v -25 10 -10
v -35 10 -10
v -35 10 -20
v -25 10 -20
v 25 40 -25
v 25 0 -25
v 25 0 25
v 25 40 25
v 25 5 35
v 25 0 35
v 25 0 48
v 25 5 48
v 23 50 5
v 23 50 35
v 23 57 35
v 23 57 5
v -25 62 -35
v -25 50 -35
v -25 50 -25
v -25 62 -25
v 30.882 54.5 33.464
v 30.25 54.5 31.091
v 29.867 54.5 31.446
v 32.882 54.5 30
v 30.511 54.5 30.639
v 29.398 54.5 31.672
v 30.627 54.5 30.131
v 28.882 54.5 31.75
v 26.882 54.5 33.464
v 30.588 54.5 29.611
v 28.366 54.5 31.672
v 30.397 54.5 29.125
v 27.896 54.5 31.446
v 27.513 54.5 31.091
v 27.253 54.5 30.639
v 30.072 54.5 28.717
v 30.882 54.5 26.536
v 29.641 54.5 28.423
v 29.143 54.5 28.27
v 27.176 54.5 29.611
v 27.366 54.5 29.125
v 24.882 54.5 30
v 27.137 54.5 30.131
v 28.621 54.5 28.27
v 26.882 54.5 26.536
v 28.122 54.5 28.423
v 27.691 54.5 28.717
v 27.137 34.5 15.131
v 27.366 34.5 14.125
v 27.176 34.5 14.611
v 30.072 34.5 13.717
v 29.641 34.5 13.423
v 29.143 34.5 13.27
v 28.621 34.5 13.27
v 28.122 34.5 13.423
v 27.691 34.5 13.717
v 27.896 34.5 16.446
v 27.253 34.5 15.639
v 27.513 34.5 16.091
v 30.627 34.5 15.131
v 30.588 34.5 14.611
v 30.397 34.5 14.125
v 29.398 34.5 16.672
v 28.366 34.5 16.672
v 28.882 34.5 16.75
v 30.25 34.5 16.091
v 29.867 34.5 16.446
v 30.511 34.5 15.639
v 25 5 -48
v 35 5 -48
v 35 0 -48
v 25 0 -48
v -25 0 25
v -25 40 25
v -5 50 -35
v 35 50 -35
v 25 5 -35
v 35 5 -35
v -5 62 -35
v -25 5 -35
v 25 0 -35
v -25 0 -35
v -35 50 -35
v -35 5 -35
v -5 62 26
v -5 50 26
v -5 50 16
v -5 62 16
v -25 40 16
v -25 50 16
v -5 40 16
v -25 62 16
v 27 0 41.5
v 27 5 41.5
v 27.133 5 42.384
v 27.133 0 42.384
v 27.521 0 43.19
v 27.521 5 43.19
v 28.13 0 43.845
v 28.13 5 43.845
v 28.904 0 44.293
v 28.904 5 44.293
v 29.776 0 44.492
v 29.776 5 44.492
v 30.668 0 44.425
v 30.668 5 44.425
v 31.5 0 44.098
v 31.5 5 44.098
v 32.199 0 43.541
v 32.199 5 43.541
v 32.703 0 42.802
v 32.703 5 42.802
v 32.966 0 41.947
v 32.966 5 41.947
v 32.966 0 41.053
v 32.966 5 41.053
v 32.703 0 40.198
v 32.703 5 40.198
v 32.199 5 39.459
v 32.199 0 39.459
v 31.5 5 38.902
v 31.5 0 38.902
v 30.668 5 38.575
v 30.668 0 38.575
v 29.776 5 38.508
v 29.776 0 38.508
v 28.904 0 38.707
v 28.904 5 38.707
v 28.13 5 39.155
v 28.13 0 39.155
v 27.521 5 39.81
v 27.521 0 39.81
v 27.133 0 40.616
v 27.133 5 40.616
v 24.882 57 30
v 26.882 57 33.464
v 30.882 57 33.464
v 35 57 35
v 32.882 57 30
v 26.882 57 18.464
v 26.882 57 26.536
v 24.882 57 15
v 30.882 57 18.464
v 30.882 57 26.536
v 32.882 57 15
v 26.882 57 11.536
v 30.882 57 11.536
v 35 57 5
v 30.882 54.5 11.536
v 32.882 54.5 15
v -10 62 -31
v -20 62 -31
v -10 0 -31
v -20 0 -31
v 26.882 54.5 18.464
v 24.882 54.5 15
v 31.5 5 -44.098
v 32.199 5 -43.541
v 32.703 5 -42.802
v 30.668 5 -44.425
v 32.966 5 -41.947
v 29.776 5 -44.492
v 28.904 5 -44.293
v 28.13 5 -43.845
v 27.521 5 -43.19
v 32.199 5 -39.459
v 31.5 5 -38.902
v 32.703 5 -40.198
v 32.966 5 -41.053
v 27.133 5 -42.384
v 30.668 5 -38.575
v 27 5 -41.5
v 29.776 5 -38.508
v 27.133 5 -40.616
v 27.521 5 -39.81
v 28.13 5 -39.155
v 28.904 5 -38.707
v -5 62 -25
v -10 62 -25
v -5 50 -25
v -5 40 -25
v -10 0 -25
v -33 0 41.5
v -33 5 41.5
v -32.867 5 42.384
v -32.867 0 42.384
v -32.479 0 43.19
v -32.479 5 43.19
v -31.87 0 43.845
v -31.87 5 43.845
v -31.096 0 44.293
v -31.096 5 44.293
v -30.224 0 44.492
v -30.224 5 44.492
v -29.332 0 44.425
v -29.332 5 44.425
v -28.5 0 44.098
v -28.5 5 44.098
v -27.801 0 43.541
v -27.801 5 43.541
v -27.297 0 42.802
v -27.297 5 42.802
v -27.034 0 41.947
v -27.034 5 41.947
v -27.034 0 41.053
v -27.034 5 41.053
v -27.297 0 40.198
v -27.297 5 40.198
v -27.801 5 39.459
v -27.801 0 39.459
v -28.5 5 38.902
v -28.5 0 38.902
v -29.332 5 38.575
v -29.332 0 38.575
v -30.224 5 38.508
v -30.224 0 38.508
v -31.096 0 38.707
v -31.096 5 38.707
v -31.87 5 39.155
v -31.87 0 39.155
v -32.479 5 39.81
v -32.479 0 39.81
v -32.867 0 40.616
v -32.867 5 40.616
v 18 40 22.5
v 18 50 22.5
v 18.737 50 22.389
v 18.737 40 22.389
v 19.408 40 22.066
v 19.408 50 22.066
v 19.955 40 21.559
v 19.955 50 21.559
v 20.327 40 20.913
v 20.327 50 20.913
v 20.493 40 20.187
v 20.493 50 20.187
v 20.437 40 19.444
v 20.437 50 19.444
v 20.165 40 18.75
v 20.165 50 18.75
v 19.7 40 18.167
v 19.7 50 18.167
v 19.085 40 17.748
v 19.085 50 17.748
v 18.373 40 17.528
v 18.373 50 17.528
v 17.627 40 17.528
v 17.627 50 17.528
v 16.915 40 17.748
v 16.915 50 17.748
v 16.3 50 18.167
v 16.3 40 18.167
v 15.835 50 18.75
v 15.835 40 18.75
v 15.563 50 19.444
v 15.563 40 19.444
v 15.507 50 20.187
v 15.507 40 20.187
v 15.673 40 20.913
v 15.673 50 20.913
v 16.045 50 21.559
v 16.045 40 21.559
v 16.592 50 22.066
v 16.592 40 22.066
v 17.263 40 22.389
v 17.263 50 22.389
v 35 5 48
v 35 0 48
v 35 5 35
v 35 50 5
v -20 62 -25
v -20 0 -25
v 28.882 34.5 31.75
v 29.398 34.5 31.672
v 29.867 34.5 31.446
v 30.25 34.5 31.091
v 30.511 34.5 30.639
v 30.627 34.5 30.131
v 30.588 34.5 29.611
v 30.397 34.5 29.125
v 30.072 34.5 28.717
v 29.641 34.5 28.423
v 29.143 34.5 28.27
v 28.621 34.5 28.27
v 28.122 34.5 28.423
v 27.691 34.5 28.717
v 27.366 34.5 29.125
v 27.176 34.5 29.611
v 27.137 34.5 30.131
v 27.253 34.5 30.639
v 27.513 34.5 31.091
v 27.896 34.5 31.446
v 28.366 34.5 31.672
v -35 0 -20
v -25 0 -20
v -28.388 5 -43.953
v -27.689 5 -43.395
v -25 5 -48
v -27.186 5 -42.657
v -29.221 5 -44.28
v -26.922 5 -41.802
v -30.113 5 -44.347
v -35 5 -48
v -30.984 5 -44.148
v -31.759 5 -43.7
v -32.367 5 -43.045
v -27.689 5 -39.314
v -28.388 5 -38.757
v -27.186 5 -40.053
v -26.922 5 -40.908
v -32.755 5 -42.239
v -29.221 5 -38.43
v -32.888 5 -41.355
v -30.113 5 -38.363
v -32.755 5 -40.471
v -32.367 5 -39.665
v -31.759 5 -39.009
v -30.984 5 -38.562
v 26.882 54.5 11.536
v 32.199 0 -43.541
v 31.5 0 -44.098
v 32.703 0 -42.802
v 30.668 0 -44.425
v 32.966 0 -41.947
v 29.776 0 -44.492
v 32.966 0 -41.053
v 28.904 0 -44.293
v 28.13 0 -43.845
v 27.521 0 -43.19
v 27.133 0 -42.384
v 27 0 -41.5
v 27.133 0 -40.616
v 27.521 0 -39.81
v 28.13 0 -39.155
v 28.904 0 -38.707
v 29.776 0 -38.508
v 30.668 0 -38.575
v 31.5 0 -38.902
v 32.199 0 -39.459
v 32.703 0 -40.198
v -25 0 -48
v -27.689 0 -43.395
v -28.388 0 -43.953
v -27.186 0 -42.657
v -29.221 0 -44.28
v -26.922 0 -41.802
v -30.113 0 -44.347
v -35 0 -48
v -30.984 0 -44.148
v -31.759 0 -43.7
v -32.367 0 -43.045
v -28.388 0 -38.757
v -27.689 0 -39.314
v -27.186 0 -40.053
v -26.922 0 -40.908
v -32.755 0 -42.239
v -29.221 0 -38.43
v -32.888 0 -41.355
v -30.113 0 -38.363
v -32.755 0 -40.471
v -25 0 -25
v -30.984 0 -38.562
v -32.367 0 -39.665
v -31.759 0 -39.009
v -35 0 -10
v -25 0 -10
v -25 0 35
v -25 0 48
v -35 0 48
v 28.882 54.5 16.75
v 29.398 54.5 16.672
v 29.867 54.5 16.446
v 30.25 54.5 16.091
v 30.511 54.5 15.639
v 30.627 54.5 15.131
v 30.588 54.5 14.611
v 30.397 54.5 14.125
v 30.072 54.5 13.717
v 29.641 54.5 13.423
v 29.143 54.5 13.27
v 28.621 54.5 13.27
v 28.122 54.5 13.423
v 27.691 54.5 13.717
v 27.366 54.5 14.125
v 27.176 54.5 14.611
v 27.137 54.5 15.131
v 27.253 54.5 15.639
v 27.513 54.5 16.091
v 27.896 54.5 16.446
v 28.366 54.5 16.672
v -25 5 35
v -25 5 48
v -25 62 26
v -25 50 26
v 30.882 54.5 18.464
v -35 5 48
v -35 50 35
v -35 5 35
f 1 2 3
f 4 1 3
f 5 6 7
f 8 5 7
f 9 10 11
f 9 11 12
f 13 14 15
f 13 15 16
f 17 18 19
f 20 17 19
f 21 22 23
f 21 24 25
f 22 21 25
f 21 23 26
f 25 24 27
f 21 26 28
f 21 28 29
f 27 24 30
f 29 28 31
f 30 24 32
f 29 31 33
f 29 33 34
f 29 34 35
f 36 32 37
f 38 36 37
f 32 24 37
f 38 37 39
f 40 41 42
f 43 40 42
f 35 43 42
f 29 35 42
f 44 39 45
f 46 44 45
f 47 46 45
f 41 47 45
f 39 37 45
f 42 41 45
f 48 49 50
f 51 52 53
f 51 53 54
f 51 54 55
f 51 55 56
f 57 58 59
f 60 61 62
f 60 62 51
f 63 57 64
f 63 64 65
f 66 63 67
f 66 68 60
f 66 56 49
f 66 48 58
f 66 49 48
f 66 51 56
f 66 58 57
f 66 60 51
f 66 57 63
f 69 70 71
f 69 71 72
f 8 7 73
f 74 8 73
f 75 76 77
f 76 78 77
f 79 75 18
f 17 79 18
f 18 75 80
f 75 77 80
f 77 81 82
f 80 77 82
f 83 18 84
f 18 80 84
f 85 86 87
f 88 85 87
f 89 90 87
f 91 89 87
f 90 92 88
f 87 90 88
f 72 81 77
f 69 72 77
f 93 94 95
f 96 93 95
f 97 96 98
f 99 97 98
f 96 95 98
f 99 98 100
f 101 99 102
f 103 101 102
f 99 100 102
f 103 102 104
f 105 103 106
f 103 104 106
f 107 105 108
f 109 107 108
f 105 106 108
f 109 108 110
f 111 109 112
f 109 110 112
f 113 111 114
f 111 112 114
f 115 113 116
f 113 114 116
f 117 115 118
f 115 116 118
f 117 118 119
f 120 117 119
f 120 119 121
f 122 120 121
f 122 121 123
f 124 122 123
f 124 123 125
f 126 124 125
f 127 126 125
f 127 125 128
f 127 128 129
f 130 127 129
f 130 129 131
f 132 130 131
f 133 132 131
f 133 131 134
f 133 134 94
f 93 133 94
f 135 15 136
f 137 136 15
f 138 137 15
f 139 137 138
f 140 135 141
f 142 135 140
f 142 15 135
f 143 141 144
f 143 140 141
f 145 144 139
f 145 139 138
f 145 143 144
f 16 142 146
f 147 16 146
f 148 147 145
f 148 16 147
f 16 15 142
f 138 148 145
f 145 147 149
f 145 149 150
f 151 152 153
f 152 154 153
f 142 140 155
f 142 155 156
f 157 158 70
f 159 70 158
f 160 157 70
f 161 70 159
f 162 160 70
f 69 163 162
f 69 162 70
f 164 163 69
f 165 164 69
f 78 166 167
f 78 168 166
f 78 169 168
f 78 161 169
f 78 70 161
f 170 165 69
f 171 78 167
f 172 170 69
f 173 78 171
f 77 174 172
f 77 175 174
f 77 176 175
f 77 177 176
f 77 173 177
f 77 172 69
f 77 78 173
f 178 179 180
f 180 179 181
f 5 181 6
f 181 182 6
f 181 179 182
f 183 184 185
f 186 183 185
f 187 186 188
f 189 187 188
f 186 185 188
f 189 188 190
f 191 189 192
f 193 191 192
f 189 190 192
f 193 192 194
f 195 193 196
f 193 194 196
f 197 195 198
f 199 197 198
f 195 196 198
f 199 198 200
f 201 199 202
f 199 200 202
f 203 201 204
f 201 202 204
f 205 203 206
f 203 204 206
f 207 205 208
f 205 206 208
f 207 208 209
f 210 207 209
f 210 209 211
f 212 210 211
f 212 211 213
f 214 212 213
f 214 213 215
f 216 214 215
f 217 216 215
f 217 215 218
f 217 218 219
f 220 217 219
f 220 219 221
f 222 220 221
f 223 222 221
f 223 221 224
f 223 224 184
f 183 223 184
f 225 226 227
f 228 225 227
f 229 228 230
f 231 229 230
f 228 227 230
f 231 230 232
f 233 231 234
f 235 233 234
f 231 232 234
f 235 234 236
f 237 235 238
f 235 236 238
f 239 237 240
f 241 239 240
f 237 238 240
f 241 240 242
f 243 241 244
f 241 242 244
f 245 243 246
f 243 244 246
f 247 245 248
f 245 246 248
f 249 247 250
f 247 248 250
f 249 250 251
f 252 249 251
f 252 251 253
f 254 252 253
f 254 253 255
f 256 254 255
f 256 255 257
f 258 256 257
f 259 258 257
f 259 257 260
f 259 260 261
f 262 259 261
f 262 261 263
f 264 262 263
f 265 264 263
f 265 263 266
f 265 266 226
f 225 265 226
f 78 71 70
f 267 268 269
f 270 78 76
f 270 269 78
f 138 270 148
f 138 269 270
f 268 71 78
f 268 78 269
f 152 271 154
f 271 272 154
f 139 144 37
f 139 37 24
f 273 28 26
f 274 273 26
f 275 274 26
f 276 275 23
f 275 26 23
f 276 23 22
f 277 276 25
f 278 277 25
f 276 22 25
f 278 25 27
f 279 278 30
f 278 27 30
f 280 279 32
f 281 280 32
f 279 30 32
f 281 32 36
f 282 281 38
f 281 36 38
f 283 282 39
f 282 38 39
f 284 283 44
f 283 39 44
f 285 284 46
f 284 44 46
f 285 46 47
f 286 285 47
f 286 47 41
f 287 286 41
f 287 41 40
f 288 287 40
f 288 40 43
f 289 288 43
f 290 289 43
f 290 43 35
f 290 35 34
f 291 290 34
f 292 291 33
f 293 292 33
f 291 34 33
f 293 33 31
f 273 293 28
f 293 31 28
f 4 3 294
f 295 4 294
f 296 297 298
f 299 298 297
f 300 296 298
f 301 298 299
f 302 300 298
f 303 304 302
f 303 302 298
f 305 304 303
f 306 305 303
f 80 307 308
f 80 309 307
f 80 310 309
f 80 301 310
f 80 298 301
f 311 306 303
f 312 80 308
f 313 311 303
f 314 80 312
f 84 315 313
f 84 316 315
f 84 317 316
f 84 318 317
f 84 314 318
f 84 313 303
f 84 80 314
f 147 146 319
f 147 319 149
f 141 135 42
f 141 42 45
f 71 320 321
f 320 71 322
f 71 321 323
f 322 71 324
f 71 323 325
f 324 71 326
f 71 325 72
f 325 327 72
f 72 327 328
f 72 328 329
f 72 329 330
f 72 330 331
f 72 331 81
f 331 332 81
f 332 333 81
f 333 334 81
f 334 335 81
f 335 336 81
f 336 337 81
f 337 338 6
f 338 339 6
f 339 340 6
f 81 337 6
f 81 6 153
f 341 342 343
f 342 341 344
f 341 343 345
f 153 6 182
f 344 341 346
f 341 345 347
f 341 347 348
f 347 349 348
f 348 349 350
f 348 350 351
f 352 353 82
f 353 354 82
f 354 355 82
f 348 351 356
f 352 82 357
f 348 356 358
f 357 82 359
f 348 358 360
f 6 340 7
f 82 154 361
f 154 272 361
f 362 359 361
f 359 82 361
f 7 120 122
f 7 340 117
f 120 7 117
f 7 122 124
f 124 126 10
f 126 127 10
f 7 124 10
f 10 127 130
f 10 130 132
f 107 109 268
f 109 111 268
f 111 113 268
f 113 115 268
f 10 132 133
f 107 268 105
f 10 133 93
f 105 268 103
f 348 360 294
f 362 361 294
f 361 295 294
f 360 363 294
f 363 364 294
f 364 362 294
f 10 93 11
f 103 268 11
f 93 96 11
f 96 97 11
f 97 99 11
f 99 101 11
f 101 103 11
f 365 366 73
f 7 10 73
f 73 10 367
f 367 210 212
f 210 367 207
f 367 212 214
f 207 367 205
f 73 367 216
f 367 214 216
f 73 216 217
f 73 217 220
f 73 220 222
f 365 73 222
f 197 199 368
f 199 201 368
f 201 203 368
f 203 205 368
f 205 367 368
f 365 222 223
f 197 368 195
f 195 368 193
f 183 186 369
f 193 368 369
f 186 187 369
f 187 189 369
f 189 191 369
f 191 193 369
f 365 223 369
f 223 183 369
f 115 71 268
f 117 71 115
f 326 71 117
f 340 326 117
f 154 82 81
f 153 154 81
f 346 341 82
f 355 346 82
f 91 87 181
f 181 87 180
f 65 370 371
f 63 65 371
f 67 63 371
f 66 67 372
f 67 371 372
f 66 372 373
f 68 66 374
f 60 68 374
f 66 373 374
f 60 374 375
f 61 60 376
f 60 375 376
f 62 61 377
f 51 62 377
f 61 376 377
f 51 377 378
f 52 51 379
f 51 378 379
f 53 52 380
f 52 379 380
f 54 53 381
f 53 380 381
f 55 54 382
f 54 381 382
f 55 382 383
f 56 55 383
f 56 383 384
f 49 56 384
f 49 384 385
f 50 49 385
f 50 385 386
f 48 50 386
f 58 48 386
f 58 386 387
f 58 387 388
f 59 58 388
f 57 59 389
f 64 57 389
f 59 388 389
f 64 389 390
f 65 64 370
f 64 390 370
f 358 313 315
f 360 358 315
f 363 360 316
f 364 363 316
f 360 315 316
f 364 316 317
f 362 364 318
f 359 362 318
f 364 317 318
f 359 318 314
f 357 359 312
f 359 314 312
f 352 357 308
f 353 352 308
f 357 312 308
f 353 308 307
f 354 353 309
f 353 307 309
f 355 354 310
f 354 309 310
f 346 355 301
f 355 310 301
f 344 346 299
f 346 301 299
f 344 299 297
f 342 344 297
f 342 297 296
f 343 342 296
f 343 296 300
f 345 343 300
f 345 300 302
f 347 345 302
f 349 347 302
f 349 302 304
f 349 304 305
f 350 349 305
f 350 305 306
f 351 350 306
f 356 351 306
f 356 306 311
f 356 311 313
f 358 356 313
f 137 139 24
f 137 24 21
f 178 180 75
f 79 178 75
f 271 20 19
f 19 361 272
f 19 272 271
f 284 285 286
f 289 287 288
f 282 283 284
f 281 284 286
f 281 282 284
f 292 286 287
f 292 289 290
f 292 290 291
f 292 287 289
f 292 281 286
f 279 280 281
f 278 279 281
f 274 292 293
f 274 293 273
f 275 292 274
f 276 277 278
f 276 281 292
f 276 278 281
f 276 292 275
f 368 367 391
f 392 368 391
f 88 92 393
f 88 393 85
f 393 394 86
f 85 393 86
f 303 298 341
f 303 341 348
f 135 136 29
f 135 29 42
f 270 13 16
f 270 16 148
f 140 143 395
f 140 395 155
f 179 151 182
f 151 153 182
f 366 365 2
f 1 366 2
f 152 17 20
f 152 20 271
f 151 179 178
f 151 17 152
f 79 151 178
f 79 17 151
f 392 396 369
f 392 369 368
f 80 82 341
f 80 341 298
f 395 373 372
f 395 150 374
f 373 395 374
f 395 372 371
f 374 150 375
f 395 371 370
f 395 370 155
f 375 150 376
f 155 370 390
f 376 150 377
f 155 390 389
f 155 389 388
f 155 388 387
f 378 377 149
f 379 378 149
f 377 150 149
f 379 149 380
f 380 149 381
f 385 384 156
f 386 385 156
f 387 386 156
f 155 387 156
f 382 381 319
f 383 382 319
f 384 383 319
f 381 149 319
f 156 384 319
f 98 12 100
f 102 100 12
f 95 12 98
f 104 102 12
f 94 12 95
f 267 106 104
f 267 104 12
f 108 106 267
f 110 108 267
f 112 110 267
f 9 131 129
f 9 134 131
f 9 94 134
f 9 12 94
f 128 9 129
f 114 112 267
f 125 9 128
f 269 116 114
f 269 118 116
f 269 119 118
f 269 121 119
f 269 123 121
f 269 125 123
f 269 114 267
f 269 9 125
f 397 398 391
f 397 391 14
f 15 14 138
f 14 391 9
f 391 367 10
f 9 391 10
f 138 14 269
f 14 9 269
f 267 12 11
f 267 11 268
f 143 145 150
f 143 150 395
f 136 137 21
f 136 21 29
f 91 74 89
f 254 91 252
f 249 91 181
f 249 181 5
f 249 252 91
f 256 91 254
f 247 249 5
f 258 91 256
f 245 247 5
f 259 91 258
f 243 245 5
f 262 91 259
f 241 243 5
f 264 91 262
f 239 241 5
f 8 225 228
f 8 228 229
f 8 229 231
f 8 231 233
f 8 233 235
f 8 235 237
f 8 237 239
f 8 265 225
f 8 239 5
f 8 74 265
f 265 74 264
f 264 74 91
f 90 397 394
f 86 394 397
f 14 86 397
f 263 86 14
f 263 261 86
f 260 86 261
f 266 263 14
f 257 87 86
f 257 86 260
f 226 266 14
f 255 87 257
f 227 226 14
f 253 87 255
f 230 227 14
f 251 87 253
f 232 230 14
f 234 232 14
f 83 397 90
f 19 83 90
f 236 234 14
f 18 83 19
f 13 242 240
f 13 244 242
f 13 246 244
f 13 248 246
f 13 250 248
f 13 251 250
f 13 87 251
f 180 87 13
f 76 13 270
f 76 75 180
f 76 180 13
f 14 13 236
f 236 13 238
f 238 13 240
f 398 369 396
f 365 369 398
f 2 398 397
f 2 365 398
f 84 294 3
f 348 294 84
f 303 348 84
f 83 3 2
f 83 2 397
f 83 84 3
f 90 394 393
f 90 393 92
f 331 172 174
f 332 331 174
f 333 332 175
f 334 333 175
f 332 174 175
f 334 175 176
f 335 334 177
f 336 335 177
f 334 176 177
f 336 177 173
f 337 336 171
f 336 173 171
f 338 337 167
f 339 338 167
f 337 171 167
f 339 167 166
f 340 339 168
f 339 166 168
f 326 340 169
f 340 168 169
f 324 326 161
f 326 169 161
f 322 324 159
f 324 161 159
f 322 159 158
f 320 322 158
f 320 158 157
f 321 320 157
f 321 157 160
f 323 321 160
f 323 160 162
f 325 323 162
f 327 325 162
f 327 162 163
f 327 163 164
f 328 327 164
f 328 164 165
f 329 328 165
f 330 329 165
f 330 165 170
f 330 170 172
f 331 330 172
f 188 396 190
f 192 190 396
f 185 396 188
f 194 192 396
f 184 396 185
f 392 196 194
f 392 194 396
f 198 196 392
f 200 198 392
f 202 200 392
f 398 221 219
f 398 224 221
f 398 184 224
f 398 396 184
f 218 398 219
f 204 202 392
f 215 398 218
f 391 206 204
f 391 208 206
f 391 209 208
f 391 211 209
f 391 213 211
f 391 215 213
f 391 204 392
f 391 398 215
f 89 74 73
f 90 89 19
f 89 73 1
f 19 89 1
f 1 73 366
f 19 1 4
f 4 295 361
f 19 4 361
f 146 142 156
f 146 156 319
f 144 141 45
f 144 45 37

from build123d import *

# Parameters (mm, degrees)
SKETCH1_W           = 70
SKETCH1_H           = 70
BOSS_EXTRUDE1_DEPTH = 50
CUT_EXTRUDE1_DEPTH  = 40
SKETCH3_W           = 20
SKETCH3_H           = 41
CUT_EXTRUDE2_DEPTH  = 40
SKETCH4_W           = 12
SKETCH4_H           = 30
BOSS_EXTRUDE2_DEPTH = 7
CUT_EXTRUDE3_DEPTH  = 2.5
SKETCH7_R           = 2.5
CUT_EXTRUDE4_DEPTH  = 52.5
SKETCH10_W          = 10
SKETCH10_H          = 6
CUT_EXTRUDE6_DEPTH  = 55
SKETCH11_W          = 20
SKETCH11_H          = 10
BOSS_EXTRUDE3_DEPTH = 12
SKETCH13_W          = 10
SKETCH13_H          = 5
BOSS_EXTRUDE4_DEPTH = 13
SKETCH14_W          = 10
SKETCH14_H          = 5
BOSS_EXTRUDE5_DEPTH = 13
SKETCH15_R          = 3
CUT_EXTRUDE7_DEPTH  = 33
CUT_EXTRUDE8_DEPTH  = 10
SKETCH18_R          = 1.75
CUT_EXTRUDE9_DEPTH  = 20


with BuildPart() as part:
    # Sketch1 → Boss-Extrude1 (new body)
    with BuildSketch(Plane(origin=(0, 0, 0), x_dir=(1, 0, 0), z_dir=(0, 1, 0))):
        Rectangle(SKETCH1_W, SKETCH1_H)
    extrude(amount=BOSS_EXTRUDE1_DEPTH)

    # Sketch2 → Cut-Extrude1 (cut)
    with BuildSketch(Plane.XZ):
        Polygon((0, 25), (-25, 25), (-25, -25), (25, -25), (25, 25), align=None)
    extrude(amount=-CUT_EXTRUDE1_DEPTH, mode=Mode.SUBTRACT)

    # Sketch3 → Cut-Extrude2 (cut)
    with BuildSketch(Plane(origin=(0, 50, 0), x_dir=(1, 0, 0), z_dir=(0, 1, 0))):
        with Locations((-15, 4.5)):
            Rectangle(SKETCH3_W, SKETCH3_H)
    extrude(amount=-CUT_EXTRUDE2_DEPTH, mode=Mode.SUBTRACT)

    # Sketch4 → Boss-Extrude2 (add)
    with BuildSketch(Plane(origin=(0, 50, 0), x_dir=(1, 0, 0), z_dir=(0, 1, 0))):
        with Locations((29, -20)):
            Rectangle(SKETCH4_W, SKETCH4_H)
    extrude(amount=BOSS_EXTRUDE2_DEPTH)

    # Sketch5 → Cut-Extrude3 (cut)
    with BuildSketch(Plane(origin=(0, 57, 0), x_dir=(1, 0, 0), z_dir=(0, 1, 0))):
        Polygon((32.881686691, -15), (30.881686691, -18.464101615), (26.881686691, -18.464101615), (24.881686691, -15), (26.881686691, -11.535898385), (30.881686691, -11.535898385), align=None)
        Polygon((26.881686691, -33.464101615), (24.881686691, -30), (26.881686691, -26.535898385), (30.881686691, -26.535898385), (32.881686691, -30), (30.881686691, -33.464101615), align=None)
    extrude(amount=-CUT_EXTRUDE3_DEPTH, mode=Mode.SUBTRACT)

    # Sketch7 → Cut-Extrude4 (cut)
    with BuildSketch(Plane(origin=(0, 50, 0), x_dir=(1, 0, 0), z_dir=(0, 1, 0))):
        with Locations(Location((18, -20, 0), (0, 0, 270))):
            Circle(SKETCH7_R)
    extrude(amount=-CUT_EXTRUDE4_DEPTH, mode=Mode.SUBTRACT)

    # Sketch10 → Cut-Extrude6 (cut)
    with BuildSketch(Plane.XZ):
        with Locations((-15, -28)):
            Rectangle(SKETCH10_W, SKETCH10_H)
    extrude(amount=-CUT_EXTRUDE6_DEPTH, mode=Mode.SUBTRACT)

    # Sketch11 → Boss-Extrude3 (add)
    with BuildSketch(Plane(origin=(0, 50, 0), x_dir=(1, 0, 0), z_dir=(0, 1, 0))):
        Polygon((-25, 35), (-25, 25), (-20, 25), (-20, 31), (-10, 31), (-10, 25), (-5, 25), (-5, 35), align=None)
        with Locations((-15, -21)):
            Rectangle(SKETCH11_W, SKETCH11_H)
    extrude(amount=BOSS_EXTRUDE3_DEPTH)

    # Sketch13 → Boss-Extrude4 (add)
    with BuildSketch(Plane.XY.offset(35)):
        with Locations((-30, 2.5)):
            Rectangle(SKETCH13_W, SKETCH13_H)
        with Locations((30, 2.5)):
            Rectangle(SKETCH13_W, SKETCH13_H)
    extrude(amount=BOSS_EXTRUDE4_DEPTH)

    # Sketch14 → Boss-Extrude5 (add)
    with BuildSketch(Plane(origin=(0, 0, -35), x_dir=(-1, 0, 0), z_dir=(0, 0, -1))):
        with Locations((-30, 2.5)):
            Rectangle(SKETCH14_W, SKETCH14_H)
        with Locations((30, 2.5)):
            Rectangle(SKETCH14_W, SKETCH14_H)
    extrude(amount=BOSS_EXTRUDE5_DEPTH)

    # Sketch15 → Cut-Extrude7 (cut)
    with BuildSketch(Plane(origin=(0, 5, 0), x_dir=(1, 0, 0), z_dir=(0, 1, 0))):
        with Locations(Location((-29.888443239, 41.354976211, 0), (0, 0, 180))):
            Circle(SKETCH15_R)
        with Locations(Location((-30, -41.5, 0), (0, 0, 180))):
            Circle(SKETCH15_R)
        with Locations(Location((30, -41.5, 0), (0, 0, 180))):
            Circle(SKETCH15_R)
        with Locations(Location((30, 41.5, 0), (0, 0, 180))):
            Circle(SKETCH15_R)
    extrude(amount=-CUT_EXTRUDE7_DEPTH, mode=Mode.SUBTRACT)

    # Sketch16 → Cut-Extrude8 (cut)
    with BuildSketch(Plane.ZY.offset(35)):
        Polygon((-10, 0), (-10, 10), (-15, 10), (-20, 10), (-20, 0), align=None)
    extrude(amount=-CUT_EXTRUDE8_DEPTH, mode=Mode.SUBTRACT)

    # Sketch18 → Cut-Extrude9 (cut)
    with BuildSketch(Plane(origin=(0, 54.5, 0), x_dir=(1, 0, 0), z_dir=(0, 1, 0))):
        with Locations(Location((28.881686691, -15, 0), (0, 0, 270))):
            Circle(SKETCH18_R)
        with Locations(Location((28.881686691, -30, 0), (0, 0, 270))):
            Circle(SKETCH18_R)
    extrude(amount=-CUT_EXTRUDE9_DEPTH, mode=Mode.SUBTRACT)


solid = part.part
